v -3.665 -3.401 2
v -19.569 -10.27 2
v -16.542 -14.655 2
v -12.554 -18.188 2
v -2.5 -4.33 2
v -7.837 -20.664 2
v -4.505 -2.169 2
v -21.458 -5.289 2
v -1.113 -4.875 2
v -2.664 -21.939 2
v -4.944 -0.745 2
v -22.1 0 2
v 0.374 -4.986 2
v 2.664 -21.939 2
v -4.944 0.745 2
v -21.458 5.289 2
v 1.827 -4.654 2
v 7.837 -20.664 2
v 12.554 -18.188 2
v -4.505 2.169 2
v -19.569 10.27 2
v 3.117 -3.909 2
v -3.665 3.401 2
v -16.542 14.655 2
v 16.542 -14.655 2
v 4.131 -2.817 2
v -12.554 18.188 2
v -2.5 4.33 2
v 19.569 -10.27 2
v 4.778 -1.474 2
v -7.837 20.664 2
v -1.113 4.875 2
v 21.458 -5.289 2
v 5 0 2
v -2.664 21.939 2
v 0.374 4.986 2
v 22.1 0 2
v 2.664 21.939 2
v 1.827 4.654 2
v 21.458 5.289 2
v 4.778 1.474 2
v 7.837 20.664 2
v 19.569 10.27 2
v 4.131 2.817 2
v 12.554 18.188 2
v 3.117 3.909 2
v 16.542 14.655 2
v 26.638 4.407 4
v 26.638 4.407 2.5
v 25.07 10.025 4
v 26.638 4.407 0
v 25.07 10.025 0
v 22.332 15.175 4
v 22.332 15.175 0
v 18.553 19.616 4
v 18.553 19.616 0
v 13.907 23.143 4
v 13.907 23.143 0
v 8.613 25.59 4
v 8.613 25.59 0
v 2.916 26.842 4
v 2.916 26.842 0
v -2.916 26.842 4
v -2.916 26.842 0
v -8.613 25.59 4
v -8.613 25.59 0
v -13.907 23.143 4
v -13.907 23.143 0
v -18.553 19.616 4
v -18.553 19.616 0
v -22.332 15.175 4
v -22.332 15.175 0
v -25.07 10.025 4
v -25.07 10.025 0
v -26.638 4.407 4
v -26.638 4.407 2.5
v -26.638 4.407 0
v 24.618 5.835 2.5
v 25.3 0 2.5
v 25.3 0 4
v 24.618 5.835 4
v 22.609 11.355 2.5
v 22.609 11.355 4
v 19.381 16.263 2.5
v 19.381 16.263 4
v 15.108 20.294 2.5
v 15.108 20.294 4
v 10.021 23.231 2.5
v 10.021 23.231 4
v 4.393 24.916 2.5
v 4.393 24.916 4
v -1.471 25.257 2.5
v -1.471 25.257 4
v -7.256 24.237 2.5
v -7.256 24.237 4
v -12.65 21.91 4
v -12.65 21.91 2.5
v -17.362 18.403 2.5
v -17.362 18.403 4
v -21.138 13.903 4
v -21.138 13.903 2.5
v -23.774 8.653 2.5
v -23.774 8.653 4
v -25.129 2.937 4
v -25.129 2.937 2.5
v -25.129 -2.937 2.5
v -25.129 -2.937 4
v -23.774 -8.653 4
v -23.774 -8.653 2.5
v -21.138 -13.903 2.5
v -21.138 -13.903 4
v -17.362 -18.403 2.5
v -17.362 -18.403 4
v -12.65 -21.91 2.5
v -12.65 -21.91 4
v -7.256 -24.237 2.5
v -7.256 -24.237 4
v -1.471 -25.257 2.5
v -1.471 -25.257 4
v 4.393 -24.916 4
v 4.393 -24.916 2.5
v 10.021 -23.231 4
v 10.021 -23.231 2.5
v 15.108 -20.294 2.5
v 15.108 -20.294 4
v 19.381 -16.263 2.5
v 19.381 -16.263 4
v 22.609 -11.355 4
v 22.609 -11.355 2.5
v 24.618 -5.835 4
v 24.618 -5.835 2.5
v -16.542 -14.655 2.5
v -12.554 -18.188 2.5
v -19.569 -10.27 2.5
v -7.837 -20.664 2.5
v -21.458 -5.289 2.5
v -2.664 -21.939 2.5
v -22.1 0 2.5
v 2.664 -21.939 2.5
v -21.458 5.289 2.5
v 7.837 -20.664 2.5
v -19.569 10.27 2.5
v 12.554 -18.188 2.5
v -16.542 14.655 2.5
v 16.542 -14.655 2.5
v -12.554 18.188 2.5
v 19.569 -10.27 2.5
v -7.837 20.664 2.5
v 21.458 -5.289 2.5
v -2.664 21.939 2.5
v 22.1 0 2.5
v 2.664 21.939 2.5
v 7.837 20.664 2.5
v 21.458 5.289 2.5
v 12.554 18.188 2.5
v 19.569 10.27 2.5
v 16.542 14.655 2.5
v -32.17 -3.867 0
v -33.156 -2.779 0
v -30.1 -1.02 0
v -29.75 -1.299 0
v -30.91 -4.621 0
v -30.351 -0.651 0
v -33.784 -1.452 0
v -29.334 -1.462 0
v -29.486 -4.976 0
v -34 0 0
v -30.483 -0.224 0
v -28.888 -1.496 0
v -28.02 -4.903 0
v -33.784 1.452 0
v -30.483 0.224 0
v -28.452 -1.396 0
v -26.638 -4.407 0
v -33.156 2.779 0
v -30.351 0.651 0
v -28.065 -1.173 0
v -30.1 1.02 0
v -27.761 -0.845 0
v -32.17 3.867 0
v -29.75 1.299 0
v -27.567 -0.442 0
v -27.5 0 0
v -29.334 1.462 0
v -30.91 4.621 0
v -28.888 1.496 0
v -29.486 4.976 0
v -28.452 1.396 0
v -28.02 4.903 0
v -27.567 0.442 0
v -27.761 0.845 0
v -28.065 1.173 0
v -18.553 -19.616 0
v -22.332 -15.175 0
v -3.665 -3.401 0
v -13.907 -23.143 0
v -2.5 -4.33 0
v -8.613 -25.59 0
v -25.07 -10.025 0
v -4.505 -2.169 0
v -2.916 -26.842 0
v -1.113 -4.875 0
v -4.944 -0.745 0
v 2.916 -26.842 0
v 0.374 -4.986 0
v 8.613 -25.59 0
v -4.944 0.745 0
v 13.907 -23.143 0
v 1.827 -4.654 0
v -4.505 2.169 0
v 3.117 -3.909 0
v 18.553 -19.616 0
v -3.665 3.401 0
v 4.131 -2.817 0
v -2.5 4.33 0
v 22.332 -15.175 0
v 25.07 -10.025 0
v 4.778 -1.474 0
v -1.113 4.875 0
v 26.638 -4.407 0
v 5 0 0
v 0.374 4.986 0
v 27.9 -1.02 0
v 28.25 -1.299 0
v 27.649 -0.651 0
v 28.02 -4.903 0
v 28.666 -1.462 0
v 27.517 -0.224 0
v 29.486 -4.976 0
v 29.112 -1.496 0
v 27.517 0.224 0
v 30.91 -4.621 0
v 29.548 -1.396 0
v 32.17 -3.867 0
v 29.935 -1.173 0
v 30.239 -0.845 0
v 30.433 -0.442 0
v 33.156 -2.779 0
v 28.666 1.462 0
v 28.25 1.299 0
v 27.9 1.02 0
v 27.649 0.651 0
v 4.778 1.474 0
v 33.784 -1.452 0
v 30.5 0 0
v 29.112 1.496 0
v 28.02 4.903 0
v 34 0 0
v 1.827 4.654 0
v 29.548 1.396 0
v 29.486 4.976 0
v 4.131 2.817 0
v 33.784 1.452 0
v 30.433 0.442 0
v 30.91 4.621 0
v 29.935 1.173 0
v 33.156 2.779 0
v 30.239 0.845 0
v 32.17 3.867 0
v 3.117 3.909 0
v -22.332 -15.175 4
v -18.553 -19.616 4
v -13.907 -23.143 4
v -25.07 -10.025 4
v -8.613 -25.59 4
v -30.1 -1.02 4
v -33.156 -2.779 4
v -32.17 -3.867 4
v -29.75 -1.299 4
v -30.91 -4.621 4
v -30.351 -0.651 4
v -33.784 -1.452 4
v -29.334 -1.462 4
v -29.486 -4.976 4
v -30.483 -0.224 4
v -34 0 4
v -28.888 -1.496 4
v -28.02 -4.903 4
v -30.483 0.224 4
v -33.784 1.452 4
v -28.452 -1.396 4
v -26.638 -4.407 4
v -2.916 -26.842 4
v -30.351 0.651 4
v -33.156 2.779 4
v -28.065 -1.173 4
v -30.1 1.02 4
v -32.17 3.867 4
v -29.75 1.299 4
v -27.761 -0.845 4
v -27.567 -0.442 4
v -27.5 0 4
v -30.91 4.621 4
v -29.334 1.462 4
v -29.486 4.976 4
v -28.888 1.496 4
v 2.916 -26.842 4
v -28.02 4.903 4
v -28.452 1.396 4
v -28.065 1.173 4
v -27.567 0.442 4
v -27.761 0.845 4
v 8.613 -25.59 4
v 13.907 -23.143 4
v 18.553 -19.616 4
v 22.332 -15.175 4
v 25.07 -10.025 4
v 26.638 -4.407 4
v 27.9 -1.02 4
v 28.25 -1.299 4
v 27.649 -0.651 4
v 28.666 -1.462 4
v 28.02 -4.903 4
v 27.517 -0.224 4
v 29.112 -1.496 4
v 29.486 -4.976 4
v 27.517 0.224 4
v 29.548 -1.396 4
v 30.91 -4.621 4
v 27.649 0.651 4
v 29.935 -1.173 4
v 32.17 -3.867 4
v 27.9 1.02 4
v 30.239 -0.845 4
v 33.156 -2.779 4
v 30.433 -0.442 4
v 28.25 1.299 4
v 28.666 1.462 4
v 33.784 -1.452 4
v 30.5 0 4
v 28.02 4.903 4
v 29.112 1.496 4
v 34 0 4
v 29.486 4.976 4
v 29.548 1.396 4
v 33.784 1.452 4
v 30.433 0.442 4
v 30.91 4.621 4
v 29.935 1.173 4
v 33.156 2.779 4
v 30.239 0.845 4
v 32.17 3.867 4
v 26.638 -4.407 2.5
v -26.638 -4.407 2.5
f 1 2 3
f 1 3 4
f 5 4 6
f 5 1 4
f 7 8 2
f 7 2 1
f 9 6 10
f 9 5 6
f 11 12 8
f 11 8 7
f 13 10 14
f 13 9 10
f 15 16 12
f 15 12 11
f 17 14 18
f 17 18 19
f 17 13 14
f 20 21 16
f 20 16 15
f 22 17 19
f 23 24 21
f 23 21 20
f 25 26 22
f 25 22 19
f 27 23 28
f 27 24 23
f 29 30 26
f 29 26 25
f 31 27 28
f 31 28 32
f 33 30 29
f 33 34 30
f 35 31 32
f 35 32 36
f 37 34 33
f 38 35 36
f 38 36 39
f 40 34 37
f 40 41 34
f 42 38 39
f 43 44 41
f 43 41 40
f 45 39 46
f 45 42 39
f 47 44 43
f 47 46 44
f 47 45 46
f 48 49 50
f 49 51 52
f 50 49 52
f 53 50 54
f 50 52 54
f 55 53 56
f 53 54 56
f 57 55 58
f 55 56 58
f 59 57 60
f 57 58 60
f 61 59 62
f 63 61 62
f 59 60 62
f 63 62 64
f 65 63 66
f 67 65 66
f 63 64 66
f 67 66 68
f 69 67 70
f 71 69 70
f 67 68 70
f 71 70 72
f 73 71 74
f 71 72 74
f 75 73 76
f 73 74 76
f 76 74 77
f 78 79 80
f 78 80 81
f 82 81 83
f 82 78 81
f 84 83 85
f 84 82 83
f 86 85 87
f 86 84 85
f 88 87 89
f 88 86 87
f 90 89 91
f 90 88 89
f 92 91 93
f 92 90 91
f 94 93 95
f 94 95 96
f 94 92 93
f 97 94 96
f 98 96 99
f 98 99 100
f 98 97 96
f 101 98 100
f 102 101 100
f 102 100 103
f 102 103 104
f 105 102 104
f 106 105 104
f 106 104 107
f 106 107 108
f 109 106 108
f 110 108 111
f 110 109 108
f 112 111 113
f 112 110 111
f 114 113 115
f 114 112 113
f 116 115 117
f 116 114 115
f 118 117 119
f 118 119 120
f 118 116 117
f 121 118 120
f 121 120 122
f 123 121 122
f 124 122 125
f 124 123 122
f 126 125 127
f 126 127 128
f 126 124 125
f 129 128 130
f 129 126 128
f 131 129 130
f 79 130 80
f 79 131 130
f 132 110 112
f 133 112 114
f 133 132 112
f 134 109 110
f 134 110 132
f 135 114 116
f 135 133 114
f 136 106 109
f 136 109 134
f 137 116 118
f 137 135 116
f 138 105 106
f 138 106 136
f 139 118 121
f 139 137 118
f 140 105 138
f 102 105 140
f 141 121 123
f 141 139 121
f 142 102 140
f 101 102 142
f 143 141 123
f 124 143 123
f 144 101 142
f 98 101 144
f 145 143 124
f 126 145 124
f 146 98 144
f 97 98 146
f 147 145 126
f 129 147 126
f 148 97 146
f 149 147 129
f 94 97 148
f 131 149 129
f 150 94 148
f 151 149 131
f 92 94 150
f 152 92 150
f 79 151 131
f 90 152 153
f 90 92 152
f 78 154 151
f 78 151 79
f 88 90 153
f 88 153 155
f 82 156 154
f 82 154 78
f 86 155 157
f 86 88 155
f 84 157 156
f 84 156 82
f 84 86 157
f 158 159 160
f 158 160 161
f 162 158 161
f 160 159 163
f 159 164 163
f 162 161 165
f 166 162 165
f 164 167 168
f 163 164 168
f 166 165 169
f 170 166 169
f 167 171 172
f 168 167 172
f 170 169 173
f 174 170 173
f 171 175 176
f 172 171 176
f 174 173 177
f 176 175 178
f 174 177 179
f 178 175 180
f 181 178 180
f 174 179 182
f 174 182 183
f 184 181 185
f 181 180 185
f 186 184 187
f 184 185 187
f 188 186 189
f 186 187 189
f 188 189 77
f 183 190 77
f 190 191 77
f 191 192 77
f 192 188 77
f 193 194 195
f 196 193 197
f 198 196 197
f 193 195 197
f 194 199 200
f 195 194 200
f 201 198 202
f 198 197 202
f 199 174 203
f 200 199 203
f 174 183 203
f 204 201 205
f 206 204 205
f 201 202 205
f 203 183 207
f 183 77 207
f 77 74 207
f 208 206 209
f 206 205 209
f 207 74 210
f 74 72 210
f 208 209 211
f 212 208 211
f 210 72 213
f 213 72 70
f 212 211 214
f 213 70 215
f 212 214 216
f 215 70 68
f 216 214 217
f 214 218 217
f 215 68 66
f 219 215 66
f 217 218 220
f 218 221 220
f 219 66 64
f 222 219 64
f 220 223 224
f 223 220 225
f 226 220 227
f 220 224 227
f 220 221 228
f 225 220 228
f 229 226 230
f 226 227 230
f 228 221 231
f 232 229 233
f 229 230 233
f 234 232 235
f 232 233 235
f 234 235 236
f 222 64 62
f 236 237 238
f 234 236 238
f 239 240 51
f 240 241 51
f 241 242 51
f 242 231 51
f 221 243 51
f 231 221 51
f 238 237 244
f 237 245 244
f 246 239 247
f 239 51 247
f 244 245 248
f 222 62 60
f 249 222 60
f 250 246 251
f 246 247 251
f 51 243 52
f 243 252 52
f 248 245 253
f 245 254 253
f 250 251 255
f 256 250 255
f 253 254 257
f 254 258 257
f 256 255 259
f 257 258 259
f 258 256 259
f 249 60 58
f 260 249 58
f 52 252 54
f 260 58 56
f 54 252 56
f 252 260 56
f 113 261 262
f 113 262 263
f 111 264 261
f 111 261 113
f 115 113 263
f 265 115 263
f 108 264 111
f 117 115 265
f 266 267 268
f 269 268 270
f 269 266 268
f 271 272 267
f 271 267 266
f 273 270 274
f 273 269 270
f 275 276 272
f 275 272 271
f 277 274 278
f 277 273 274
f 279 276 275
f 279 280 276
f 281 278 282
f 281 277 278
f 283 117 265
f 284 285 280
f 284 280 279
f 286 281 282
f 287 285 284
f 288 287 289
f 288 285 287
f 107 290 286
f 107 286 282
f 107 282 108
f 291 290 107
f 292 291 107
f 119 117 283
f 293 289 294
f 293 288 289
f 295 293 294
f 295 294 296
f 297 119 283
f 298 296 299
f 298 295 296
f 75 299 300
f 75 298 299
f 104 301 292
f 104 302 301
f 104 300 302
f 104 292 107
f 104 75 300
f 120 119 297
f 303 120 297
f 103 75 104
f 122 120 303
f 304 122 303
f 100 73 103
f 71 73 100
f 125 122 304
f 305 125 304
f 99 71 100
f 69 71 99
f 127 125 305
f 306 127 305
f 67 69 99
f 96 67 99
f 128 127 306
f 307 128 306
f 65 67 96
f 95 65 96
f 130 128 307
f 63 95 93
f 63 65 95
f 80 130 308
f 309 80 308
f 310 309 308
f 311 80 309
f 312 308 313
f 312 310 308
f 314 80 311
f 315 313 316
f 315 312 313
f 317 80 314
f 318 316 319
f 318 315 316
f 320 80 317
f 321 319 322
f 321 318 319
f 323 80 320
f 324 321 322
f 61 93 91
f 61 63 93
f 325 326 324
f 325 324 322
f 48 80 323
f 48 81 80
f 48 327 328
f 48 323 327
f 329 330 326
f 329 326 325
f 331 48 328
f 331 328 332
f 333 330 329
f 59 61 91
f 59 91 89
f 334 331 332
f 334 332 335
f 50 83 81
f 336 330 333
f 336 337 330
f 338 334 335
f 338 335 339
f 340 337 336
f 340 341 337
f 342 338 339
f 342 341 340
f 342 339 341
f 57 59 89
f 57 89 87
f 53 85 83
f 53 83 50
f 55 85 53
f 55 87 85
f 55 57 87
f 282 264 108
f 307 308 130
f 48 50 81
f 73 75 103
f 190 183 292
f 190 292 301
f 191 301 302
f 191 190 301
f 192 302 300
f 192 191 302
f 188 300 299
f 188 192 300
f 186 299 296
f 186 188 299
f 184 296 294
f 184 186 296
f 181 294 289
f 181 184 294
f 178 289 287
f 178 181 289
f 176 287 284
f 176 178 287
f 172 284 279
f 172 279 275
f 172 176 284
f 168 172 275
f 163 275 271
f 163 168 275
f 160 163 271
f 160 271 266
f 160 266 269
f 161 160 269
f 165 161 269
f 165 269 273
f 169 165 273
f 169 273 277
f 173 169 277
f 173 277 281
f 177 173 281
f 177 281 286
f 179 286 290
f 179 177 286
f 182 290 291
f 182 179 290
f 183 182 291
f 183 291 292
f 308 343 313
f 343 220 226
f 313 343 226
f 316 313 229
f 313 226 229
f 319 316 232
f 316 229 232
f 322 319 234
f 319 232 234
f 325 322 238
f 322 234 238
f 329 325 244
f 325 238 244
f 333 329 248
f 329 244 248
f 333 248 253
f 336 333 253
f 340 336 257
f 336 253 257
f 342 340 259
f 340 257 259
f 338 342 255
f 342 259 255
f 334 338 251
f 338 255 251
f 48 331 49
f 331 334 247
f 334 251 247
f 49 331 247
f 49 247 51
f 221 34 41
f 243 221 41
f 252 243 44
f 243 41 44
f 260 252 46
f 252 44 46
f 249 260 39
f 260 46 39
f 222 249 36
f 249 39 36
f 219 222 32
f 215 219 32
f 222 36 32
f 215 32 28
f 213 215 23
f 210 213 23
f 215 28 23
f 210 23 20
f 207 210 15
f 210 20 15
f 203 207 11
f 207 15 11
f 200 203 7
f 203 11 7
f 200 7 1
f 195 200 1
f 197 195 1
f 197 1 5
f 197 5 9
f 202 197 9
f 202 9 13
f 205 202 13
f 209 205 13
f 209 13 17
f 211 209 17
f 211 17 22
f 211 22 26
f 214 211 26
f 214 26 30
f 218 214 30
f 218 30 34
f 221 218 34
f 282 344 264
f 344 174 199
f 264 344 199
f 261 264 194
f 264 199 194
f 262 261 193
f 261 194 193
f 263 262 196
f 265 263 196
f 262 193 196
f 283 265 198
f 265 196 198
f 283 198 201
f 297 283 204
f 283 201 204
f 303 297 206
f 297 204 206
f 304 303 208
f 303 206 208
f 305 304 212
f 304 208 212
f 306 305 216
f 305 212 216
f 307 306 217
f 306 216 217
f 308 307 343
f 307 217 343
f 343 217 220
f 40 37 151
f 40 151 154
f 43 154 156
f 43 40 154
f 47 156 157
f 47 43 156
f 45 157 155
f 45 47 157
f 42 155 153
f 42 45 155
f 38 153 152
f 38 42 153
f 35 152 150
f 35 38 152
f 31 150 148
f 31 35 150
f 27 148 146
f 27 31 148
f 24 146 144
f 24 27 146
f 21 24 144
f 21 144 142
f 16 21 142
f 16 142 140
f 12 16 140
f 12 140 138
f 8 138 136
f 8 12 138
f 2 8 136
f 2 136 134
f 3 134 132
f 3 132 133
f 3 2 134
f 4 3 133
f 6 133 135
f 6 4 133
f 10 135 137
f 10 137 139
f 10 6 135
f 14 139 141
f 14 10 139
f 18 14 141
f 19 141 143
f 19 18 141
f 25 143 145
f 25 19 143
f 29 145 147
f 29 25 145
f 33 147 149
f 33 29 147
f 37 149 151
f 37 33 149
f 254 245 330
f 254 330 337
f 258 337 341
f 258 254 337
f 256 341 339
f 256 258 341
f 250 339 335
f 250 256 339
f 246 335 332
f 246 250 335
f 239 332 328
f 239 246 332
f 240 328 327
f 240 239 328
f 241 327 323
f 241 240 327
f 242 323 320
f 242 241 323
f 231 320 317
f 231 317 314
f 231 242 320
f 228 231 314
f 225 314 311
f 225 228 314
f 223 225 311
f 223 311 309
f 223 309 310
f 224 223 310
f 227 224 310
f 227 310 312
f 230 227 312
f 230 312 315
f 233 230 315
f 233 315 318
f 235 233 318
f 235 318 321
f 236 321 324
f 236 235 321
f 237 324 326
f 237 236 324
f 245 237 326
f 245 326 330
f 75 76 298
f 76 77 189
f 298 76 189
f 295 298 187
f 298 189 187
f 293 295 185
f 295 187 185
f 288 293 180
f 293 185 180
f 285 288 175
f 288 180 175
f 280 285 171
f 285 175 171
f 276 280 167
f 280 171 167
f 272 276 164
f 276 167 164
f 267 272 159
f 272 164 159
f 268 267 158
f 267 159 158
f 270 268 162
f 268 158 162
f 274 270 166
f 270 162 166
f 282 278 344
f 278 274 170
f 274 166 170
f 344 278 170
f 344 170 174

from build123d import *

# Parameters (mm, degrees)
F0_R     = 1.5
F1_DEPTH = 4
F2_DEPTH = 2
F3_R     = 27
F3_R_2   = 22.1
F4_DEPTH = 0.5
F5_R     = 25.3
F6_DEPTH = 1.5
F7_R     = 5
F8_DEPTH = 25


with BuildPart() as f1:
    # F0 (on Top) → F1 (new body)
    with BuildSketch(Plane.XY):
        with BuildLine():
            ThreePointArc((-26.6379310345, -4.4068844099), (-27, 0), (-26.6379310345, 4.4068844099))
            ThreePointArc((-26.6379310345, 4.4068844099), (-34, 0), (-26.6379310345, -4.4068844099))
        make_face()
        with Locations((-29, 0)):
            Circle(F0_R, mode=Mode.SUBTRACT)
    extrude(amount=F1_DEPTH)



with BuildPart() as f1b:
    # F0 (on Top) → F1, piece 2 (new body)
    with BuildSketch(Plane.XY):
        with BuildLine():
            ThreePointArc((26.6379310345, 4.4068844099), (26.9093305187, 2.21086658), (27, 0))
            ThreePointArc((27, 0), (26.9093305187, -2.21086658), (26.6379310345, -4.4068844099))
            ThreePointArc((26.6379310345, -4.4068844099), (31.5680396388, -4.2901249881), (34, 0))
            ThreePointArc((34, 0), (31.5680396388, 4.2901249881), (26.6379310345, 4.4068844099))
        make_face()
        with Locations((29, 0)):
            Circle(F0_R, mode=Mode.SUBTRACT)
    extrude(amount=F1_DEPTH)


with BuildPart() as f2:
    # F0 (on Top) → F2 (new body)
    with BuildSketch(Plane.XY):
        with BuildLine():
            ThreePointArc((-24, 0), (-24.7098750119, 2.5680396388), (-26.6379310345, 4.4068844099))
            ThreePointArc((-26.6379310345, 4.4068844099), (-27, 0), (-26.6379310345, -4.4068844099))
            ThreePointArc((-26.6379310345, -4.4068844099), (-24.7098750119, -2.5680396388), (-24, 0))
        make_face()
        with BuildLine():
            ThreePointArc((26.6379310345, -4.4068844099), (26.9093305187, -2.21086658), (27, 0))
            ThreePointArc((27, 0), (26.9093305187, 2.21086658), (26.6379310345, 4.4068844099))
            ThreePointArc((26.6379310345, 4.4068844099), (24, 0), (26.6379310345, -4.4068844099))
        make_face()
        with BuildLine():
            ThreePointArc((26.6379310345, -4.4068844099), (24, 0), (26.6379310345, 4.4068844099))
            ThreePointArc((26.6379310345, 4.4068844099), (0, 27), (-26.6379310345, 4.4068844099))
            ThreePointArc((-26.6379310345, 4.4068844099), (-24.7098750119, 2.5680396388), (-24, 0))
            ThreePointArc((-24, 0), (-24.7098750119, -2.5680396388), (-26.6379310345, -4.4068844099))
            ThreePointArc((-26.6379310345, -4.4068844099), (0, -27), (26.6379310345, -4.4068844099))
        make_face()
    extrude(amount=F2_DEPTH)


with BuildPart() as f1_1:
    add(f1.part)

    add(f1b.part)  # F4 merges F1b

    add(f2.part)  # F4 merges F2
    # F3 (on face) → F4 (join)
    with BuildSketch(Plane.XY.offset(2)):
        Circle(F3_R)
        Circle(F3_R_2, mode=Mode.SUBTRACT)
    extrude(amount=F4_DEPTH)

    # F5 (on face) → F6 (join)
    with BuildSketch(Plane.XY.offset(2.5)):
        with BuildLine():
            ThreePointArc((26.6379310345, -4.4068844099), (27, 0), (26.6379310345, 4.4068844099))
            ThreePointArc((26.6379310345, 4.4068844099), (0, 27), (-26.6379310345, 4.4068844099))
            ThreePointArc((-26.6379310345, 4.4068844099), (-27, 0), (-26.6379310345, -4.4068844099))
            ThreePointArc((-26.6379310345, -4.4068844099), (0, -27), (26.6379310345, -4.4068844099))
        make_face()
        Circle(F5_R, mode=Mode.SUBTRACT)
    extrude(amount=F6_DEPTH)

    # F7 (on face) → F8 (cut)
    with BuildSketch(Plane.XY.offset(2)):
        Circle(F7_R)
    extrude(amount=-F8_DEPTH, mode=Mode.SUBTRACT)


solid = f1_1.part
